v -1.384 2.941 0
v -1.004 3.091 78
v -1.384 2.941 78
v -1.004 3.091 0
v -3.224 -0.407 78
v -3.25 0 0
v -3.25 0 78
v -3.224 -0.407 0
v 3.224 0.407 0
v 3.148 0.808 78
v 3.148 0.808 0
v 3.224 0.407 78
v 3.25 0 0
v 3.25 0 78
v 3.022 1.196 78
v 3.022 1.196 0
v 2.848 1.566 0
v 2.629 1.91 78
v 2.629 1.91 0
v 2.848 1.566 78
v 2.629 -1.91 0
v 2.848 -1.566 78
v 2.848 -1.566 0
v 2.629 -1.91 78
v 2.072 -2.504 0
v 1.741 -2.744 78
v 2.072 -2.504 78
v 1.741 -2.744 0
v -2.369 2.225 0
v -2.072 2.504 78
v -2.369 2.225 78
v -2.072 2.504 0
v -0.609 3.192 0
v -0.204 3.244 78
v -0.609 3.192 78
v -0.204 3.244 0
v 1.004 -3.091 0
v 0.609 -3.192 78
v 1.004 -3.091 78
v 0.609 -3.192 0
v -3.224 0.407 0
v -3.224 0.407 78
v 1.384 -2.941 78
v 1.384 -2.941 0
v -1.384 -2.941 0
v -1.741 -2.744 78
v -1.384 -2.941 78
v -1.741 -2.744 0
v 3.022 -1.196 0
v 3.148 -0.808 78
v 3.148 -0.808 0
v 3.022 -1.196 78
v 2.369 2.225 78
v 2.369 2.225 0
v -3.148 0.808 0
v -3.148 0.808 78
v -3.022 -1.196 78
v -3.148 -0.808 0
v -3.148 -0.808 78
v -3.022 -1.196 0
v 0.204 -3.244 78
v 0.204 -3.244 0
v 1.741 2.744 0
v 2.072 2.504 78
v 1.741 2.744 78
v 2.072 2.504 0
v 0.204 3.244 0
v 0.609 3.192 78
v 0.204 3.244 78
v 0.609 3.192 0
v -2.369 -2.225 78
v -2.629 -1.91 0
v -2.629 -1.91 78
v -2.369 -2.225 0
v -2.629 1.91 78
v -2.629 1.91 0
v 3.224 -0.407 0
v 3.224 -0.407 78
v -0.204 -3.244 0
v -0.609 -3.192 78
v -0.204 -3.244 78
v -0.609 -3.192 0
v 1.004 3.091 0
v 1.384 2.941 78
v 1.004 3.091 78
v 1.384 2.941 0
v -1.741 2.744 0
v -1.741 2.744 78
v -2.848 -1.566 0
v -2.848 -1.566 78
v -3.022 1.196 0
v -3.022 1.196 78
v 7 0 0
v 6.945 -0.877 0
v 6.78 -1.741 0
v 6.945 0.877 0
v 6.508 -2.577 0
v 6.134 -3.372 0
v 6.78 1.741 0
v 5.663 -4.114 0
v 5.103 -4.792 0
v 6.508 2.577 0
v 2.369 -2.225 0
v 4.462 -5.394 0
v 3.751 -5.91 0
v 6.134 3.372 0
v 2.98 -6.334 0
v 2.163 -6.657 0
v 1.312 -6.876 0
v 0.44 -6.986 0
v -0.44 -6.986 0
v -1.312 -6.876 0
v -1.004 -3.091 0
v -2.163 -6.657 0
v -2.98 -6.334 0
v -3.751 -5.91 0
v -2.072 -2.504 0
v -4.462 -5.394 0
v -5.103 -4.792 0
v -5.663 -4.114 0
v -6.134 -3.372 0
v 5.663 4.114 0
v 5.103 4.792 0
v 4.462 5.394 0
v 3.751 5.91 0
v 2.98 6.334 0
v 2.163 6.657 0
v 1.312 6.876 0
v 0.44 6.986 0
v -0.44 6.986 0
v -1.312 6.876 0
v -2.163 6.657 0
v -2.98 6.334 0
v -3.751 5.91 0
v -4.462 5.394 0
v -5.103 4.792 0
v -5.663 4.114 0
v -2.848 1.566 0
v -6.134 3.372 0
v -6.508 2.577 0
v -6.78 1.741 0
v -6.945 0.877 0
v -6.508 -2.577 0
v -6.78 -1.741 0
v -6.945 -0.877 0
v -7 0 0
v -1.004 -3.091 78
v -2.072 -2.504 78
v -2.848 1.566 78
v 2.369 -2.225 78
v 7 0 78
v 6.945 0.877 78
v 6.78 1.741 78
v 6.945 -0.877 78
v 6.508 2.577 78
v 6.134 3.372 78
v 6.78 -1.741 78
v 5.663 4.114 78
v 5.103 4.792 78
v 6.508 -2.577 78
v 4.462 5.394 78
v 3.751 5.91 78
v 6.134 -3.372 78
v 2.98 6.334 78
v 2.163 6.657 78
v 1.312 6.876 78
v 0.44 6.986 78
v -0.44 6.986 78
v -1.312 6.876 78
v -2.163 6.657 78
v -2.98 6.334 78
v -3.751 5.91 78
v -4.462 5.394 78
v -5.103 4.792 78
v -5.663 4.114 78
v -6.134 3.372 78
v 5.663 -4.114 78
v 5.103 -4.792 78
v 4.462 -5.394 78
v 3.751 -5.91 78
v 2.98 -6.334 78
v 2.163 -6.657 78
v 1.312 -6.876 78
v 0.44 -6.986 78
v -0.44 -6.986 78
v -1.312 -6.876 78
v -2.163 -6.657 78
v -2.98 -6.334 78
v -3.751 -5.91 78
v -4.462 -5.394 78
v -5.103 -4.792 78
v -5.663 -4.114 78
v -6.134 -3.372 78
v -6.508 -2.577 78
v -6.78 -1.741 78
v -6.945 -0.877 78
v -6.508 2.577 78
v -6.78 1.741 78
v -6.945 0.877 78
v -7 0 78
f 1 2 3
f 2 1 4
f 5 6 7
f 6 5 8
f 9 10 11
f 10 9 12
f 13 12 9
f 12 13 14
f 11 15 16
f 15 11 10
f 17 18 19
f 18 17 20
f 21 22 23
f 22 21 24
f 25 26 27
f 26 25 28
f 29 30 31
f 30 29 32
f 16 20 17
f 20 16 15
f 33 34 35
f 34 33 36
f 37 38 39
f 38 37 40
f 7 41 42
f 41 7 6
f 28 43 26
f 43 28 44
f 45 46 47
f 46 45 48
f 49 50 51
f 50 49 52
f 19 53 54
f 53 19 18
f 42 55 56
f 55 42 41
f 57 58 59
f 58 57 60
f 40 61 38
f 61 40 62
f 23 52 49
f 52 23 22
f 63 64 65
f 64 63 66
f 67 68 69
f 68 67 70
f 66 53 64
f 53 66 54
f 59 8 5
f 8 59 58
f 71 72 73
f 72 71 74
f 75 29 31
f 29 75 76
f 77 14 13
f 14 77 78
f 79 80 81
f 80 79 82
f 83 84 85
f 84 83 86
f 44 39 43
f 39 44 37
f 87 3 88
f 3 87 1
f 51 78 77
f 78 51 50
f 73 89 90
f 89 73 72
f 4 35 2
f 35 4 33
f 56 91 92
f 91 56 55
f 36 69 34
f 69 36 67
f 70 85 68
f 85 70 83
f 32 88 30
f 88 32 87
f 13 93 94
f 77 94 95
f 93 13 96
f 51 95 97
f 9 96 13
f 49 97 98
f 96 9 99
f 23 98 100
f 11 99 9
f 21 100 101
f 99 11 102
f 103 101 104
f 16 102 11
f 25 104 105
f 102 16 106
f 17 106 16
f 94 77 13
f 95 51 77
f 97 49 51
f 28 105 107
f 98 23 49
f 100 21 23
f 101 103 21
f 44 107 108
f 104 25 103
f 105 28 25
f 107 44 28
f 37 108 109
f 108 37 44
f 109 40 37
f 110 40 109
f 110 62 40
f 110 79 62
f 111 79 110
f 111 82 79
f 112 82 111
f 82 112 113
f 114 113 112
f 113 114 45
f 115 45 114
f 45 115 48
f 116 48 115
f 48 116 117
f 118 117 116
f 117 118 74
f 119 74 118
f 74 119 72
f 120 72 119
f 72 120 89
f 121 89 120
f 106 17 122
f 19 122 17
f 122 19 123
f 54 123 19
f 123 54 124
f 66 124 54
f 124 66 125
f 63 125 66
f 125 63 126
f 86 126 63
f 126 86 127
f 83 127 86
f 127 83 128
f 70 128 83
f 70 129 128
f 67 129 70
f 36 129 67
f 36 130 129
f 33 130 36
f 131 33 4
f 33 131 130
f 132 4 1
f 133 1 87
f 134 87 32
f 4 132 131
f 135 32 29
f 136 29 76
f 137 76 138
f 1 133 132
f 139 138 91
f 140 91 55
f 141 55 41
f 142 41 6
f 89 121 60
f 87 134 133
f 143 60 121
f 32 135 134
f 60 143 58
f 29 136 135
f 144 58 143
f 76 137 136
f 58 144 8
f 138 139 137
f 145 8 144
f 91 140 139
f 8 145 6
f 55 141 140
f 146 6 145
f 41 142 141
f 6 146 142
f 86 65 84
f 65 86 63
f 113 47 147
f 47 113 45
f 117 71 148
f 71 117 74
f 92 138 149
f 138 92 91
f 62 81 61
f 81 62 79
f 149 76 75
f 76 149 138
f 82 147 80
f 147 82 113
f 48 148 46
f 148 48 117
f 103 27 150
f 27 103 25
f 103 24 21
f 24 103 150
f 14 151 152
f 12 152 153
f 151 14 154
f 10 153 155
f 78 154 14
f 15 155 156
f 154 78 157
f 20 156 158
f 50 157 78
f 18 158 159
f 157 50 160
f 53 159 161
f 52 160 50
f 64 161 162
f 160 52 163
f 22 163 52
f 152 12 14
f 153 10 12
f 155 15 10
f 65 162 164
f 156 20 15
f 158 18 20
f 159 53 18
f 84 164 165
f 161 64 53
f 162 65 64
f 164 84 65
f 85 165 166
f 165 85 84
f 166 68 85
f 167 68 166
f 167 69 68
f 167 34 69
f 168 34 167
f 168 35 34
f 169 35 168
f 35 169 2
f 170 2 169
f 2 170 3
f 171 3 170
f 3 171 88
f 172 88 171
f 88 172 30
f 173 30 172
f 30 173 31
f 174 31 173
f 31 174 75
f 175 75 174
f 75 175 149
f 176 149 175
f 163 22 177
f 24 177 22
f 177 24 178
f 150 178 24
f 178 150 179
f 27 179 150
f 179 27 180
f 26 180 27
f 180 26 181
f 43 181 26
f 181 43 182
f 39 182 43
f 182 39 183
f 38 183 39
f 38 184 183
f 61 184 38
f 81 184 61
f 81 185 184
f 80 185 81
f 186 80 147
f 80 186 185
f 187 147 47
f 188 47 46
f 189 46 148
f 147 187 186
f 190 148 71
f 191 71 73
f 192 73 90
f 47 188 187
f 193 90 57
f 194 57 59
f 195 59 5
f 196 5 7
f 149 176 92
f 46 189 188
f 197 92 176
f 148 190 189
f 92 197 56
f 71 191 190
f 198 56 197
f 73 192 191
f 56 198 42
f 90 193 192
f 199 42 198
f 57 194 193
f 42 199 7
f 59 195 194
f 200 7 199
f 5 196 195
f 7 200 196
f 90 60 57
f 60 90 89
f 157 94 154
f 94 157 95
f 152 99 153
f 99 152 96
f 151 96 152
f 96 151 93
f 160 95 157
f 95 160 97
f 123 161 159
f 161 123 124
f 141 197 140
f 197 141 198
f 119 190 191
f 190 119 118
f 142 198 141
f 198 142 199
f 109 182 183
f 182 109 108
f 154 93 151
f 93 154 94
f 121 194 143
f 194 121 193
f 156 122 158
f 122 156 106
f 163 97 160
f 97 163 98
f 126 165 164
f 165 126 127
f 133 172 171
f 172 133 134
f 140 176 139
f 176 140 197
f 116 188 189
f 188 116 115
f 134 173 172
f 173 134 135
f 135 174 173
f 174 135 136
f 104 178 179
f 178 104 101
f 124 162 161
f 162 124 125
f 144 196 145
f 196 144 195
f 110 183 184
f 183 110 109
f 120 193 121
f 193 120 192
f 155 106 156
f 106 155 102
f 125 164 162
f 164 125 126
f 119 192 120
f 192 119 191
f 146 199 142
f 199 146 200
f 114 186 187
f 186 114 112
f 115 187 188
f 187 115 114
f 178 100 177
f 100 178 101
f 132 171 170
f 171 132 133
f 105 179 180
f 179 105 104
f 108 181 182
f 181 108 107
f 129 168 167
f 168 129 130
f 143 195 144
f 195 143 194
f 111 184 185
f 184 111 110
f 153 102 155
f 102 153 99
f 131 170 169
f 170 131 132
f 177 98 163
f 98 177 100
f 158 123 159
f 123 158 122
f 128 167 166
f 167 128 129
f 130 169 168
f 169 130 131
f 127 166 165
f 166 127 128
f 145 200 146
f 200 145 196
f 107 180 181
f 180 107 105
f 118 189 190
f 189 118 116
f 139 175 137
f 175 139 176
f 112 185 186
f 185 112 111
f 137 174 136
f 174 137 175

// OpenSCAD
$fn = 50;


difference() {
	union() {
		cylinder(h = 78, r = 7.0000000000);
	}
	union() {
		cylinder(h = 78, r = 3.2500000000);
		cylinder(h = 78, r = 1.8000000000);
		cylinder(h = 78, r = 1.8000000000);
		cylinder(h = 78, r = 1.8000000000);
	}
}
